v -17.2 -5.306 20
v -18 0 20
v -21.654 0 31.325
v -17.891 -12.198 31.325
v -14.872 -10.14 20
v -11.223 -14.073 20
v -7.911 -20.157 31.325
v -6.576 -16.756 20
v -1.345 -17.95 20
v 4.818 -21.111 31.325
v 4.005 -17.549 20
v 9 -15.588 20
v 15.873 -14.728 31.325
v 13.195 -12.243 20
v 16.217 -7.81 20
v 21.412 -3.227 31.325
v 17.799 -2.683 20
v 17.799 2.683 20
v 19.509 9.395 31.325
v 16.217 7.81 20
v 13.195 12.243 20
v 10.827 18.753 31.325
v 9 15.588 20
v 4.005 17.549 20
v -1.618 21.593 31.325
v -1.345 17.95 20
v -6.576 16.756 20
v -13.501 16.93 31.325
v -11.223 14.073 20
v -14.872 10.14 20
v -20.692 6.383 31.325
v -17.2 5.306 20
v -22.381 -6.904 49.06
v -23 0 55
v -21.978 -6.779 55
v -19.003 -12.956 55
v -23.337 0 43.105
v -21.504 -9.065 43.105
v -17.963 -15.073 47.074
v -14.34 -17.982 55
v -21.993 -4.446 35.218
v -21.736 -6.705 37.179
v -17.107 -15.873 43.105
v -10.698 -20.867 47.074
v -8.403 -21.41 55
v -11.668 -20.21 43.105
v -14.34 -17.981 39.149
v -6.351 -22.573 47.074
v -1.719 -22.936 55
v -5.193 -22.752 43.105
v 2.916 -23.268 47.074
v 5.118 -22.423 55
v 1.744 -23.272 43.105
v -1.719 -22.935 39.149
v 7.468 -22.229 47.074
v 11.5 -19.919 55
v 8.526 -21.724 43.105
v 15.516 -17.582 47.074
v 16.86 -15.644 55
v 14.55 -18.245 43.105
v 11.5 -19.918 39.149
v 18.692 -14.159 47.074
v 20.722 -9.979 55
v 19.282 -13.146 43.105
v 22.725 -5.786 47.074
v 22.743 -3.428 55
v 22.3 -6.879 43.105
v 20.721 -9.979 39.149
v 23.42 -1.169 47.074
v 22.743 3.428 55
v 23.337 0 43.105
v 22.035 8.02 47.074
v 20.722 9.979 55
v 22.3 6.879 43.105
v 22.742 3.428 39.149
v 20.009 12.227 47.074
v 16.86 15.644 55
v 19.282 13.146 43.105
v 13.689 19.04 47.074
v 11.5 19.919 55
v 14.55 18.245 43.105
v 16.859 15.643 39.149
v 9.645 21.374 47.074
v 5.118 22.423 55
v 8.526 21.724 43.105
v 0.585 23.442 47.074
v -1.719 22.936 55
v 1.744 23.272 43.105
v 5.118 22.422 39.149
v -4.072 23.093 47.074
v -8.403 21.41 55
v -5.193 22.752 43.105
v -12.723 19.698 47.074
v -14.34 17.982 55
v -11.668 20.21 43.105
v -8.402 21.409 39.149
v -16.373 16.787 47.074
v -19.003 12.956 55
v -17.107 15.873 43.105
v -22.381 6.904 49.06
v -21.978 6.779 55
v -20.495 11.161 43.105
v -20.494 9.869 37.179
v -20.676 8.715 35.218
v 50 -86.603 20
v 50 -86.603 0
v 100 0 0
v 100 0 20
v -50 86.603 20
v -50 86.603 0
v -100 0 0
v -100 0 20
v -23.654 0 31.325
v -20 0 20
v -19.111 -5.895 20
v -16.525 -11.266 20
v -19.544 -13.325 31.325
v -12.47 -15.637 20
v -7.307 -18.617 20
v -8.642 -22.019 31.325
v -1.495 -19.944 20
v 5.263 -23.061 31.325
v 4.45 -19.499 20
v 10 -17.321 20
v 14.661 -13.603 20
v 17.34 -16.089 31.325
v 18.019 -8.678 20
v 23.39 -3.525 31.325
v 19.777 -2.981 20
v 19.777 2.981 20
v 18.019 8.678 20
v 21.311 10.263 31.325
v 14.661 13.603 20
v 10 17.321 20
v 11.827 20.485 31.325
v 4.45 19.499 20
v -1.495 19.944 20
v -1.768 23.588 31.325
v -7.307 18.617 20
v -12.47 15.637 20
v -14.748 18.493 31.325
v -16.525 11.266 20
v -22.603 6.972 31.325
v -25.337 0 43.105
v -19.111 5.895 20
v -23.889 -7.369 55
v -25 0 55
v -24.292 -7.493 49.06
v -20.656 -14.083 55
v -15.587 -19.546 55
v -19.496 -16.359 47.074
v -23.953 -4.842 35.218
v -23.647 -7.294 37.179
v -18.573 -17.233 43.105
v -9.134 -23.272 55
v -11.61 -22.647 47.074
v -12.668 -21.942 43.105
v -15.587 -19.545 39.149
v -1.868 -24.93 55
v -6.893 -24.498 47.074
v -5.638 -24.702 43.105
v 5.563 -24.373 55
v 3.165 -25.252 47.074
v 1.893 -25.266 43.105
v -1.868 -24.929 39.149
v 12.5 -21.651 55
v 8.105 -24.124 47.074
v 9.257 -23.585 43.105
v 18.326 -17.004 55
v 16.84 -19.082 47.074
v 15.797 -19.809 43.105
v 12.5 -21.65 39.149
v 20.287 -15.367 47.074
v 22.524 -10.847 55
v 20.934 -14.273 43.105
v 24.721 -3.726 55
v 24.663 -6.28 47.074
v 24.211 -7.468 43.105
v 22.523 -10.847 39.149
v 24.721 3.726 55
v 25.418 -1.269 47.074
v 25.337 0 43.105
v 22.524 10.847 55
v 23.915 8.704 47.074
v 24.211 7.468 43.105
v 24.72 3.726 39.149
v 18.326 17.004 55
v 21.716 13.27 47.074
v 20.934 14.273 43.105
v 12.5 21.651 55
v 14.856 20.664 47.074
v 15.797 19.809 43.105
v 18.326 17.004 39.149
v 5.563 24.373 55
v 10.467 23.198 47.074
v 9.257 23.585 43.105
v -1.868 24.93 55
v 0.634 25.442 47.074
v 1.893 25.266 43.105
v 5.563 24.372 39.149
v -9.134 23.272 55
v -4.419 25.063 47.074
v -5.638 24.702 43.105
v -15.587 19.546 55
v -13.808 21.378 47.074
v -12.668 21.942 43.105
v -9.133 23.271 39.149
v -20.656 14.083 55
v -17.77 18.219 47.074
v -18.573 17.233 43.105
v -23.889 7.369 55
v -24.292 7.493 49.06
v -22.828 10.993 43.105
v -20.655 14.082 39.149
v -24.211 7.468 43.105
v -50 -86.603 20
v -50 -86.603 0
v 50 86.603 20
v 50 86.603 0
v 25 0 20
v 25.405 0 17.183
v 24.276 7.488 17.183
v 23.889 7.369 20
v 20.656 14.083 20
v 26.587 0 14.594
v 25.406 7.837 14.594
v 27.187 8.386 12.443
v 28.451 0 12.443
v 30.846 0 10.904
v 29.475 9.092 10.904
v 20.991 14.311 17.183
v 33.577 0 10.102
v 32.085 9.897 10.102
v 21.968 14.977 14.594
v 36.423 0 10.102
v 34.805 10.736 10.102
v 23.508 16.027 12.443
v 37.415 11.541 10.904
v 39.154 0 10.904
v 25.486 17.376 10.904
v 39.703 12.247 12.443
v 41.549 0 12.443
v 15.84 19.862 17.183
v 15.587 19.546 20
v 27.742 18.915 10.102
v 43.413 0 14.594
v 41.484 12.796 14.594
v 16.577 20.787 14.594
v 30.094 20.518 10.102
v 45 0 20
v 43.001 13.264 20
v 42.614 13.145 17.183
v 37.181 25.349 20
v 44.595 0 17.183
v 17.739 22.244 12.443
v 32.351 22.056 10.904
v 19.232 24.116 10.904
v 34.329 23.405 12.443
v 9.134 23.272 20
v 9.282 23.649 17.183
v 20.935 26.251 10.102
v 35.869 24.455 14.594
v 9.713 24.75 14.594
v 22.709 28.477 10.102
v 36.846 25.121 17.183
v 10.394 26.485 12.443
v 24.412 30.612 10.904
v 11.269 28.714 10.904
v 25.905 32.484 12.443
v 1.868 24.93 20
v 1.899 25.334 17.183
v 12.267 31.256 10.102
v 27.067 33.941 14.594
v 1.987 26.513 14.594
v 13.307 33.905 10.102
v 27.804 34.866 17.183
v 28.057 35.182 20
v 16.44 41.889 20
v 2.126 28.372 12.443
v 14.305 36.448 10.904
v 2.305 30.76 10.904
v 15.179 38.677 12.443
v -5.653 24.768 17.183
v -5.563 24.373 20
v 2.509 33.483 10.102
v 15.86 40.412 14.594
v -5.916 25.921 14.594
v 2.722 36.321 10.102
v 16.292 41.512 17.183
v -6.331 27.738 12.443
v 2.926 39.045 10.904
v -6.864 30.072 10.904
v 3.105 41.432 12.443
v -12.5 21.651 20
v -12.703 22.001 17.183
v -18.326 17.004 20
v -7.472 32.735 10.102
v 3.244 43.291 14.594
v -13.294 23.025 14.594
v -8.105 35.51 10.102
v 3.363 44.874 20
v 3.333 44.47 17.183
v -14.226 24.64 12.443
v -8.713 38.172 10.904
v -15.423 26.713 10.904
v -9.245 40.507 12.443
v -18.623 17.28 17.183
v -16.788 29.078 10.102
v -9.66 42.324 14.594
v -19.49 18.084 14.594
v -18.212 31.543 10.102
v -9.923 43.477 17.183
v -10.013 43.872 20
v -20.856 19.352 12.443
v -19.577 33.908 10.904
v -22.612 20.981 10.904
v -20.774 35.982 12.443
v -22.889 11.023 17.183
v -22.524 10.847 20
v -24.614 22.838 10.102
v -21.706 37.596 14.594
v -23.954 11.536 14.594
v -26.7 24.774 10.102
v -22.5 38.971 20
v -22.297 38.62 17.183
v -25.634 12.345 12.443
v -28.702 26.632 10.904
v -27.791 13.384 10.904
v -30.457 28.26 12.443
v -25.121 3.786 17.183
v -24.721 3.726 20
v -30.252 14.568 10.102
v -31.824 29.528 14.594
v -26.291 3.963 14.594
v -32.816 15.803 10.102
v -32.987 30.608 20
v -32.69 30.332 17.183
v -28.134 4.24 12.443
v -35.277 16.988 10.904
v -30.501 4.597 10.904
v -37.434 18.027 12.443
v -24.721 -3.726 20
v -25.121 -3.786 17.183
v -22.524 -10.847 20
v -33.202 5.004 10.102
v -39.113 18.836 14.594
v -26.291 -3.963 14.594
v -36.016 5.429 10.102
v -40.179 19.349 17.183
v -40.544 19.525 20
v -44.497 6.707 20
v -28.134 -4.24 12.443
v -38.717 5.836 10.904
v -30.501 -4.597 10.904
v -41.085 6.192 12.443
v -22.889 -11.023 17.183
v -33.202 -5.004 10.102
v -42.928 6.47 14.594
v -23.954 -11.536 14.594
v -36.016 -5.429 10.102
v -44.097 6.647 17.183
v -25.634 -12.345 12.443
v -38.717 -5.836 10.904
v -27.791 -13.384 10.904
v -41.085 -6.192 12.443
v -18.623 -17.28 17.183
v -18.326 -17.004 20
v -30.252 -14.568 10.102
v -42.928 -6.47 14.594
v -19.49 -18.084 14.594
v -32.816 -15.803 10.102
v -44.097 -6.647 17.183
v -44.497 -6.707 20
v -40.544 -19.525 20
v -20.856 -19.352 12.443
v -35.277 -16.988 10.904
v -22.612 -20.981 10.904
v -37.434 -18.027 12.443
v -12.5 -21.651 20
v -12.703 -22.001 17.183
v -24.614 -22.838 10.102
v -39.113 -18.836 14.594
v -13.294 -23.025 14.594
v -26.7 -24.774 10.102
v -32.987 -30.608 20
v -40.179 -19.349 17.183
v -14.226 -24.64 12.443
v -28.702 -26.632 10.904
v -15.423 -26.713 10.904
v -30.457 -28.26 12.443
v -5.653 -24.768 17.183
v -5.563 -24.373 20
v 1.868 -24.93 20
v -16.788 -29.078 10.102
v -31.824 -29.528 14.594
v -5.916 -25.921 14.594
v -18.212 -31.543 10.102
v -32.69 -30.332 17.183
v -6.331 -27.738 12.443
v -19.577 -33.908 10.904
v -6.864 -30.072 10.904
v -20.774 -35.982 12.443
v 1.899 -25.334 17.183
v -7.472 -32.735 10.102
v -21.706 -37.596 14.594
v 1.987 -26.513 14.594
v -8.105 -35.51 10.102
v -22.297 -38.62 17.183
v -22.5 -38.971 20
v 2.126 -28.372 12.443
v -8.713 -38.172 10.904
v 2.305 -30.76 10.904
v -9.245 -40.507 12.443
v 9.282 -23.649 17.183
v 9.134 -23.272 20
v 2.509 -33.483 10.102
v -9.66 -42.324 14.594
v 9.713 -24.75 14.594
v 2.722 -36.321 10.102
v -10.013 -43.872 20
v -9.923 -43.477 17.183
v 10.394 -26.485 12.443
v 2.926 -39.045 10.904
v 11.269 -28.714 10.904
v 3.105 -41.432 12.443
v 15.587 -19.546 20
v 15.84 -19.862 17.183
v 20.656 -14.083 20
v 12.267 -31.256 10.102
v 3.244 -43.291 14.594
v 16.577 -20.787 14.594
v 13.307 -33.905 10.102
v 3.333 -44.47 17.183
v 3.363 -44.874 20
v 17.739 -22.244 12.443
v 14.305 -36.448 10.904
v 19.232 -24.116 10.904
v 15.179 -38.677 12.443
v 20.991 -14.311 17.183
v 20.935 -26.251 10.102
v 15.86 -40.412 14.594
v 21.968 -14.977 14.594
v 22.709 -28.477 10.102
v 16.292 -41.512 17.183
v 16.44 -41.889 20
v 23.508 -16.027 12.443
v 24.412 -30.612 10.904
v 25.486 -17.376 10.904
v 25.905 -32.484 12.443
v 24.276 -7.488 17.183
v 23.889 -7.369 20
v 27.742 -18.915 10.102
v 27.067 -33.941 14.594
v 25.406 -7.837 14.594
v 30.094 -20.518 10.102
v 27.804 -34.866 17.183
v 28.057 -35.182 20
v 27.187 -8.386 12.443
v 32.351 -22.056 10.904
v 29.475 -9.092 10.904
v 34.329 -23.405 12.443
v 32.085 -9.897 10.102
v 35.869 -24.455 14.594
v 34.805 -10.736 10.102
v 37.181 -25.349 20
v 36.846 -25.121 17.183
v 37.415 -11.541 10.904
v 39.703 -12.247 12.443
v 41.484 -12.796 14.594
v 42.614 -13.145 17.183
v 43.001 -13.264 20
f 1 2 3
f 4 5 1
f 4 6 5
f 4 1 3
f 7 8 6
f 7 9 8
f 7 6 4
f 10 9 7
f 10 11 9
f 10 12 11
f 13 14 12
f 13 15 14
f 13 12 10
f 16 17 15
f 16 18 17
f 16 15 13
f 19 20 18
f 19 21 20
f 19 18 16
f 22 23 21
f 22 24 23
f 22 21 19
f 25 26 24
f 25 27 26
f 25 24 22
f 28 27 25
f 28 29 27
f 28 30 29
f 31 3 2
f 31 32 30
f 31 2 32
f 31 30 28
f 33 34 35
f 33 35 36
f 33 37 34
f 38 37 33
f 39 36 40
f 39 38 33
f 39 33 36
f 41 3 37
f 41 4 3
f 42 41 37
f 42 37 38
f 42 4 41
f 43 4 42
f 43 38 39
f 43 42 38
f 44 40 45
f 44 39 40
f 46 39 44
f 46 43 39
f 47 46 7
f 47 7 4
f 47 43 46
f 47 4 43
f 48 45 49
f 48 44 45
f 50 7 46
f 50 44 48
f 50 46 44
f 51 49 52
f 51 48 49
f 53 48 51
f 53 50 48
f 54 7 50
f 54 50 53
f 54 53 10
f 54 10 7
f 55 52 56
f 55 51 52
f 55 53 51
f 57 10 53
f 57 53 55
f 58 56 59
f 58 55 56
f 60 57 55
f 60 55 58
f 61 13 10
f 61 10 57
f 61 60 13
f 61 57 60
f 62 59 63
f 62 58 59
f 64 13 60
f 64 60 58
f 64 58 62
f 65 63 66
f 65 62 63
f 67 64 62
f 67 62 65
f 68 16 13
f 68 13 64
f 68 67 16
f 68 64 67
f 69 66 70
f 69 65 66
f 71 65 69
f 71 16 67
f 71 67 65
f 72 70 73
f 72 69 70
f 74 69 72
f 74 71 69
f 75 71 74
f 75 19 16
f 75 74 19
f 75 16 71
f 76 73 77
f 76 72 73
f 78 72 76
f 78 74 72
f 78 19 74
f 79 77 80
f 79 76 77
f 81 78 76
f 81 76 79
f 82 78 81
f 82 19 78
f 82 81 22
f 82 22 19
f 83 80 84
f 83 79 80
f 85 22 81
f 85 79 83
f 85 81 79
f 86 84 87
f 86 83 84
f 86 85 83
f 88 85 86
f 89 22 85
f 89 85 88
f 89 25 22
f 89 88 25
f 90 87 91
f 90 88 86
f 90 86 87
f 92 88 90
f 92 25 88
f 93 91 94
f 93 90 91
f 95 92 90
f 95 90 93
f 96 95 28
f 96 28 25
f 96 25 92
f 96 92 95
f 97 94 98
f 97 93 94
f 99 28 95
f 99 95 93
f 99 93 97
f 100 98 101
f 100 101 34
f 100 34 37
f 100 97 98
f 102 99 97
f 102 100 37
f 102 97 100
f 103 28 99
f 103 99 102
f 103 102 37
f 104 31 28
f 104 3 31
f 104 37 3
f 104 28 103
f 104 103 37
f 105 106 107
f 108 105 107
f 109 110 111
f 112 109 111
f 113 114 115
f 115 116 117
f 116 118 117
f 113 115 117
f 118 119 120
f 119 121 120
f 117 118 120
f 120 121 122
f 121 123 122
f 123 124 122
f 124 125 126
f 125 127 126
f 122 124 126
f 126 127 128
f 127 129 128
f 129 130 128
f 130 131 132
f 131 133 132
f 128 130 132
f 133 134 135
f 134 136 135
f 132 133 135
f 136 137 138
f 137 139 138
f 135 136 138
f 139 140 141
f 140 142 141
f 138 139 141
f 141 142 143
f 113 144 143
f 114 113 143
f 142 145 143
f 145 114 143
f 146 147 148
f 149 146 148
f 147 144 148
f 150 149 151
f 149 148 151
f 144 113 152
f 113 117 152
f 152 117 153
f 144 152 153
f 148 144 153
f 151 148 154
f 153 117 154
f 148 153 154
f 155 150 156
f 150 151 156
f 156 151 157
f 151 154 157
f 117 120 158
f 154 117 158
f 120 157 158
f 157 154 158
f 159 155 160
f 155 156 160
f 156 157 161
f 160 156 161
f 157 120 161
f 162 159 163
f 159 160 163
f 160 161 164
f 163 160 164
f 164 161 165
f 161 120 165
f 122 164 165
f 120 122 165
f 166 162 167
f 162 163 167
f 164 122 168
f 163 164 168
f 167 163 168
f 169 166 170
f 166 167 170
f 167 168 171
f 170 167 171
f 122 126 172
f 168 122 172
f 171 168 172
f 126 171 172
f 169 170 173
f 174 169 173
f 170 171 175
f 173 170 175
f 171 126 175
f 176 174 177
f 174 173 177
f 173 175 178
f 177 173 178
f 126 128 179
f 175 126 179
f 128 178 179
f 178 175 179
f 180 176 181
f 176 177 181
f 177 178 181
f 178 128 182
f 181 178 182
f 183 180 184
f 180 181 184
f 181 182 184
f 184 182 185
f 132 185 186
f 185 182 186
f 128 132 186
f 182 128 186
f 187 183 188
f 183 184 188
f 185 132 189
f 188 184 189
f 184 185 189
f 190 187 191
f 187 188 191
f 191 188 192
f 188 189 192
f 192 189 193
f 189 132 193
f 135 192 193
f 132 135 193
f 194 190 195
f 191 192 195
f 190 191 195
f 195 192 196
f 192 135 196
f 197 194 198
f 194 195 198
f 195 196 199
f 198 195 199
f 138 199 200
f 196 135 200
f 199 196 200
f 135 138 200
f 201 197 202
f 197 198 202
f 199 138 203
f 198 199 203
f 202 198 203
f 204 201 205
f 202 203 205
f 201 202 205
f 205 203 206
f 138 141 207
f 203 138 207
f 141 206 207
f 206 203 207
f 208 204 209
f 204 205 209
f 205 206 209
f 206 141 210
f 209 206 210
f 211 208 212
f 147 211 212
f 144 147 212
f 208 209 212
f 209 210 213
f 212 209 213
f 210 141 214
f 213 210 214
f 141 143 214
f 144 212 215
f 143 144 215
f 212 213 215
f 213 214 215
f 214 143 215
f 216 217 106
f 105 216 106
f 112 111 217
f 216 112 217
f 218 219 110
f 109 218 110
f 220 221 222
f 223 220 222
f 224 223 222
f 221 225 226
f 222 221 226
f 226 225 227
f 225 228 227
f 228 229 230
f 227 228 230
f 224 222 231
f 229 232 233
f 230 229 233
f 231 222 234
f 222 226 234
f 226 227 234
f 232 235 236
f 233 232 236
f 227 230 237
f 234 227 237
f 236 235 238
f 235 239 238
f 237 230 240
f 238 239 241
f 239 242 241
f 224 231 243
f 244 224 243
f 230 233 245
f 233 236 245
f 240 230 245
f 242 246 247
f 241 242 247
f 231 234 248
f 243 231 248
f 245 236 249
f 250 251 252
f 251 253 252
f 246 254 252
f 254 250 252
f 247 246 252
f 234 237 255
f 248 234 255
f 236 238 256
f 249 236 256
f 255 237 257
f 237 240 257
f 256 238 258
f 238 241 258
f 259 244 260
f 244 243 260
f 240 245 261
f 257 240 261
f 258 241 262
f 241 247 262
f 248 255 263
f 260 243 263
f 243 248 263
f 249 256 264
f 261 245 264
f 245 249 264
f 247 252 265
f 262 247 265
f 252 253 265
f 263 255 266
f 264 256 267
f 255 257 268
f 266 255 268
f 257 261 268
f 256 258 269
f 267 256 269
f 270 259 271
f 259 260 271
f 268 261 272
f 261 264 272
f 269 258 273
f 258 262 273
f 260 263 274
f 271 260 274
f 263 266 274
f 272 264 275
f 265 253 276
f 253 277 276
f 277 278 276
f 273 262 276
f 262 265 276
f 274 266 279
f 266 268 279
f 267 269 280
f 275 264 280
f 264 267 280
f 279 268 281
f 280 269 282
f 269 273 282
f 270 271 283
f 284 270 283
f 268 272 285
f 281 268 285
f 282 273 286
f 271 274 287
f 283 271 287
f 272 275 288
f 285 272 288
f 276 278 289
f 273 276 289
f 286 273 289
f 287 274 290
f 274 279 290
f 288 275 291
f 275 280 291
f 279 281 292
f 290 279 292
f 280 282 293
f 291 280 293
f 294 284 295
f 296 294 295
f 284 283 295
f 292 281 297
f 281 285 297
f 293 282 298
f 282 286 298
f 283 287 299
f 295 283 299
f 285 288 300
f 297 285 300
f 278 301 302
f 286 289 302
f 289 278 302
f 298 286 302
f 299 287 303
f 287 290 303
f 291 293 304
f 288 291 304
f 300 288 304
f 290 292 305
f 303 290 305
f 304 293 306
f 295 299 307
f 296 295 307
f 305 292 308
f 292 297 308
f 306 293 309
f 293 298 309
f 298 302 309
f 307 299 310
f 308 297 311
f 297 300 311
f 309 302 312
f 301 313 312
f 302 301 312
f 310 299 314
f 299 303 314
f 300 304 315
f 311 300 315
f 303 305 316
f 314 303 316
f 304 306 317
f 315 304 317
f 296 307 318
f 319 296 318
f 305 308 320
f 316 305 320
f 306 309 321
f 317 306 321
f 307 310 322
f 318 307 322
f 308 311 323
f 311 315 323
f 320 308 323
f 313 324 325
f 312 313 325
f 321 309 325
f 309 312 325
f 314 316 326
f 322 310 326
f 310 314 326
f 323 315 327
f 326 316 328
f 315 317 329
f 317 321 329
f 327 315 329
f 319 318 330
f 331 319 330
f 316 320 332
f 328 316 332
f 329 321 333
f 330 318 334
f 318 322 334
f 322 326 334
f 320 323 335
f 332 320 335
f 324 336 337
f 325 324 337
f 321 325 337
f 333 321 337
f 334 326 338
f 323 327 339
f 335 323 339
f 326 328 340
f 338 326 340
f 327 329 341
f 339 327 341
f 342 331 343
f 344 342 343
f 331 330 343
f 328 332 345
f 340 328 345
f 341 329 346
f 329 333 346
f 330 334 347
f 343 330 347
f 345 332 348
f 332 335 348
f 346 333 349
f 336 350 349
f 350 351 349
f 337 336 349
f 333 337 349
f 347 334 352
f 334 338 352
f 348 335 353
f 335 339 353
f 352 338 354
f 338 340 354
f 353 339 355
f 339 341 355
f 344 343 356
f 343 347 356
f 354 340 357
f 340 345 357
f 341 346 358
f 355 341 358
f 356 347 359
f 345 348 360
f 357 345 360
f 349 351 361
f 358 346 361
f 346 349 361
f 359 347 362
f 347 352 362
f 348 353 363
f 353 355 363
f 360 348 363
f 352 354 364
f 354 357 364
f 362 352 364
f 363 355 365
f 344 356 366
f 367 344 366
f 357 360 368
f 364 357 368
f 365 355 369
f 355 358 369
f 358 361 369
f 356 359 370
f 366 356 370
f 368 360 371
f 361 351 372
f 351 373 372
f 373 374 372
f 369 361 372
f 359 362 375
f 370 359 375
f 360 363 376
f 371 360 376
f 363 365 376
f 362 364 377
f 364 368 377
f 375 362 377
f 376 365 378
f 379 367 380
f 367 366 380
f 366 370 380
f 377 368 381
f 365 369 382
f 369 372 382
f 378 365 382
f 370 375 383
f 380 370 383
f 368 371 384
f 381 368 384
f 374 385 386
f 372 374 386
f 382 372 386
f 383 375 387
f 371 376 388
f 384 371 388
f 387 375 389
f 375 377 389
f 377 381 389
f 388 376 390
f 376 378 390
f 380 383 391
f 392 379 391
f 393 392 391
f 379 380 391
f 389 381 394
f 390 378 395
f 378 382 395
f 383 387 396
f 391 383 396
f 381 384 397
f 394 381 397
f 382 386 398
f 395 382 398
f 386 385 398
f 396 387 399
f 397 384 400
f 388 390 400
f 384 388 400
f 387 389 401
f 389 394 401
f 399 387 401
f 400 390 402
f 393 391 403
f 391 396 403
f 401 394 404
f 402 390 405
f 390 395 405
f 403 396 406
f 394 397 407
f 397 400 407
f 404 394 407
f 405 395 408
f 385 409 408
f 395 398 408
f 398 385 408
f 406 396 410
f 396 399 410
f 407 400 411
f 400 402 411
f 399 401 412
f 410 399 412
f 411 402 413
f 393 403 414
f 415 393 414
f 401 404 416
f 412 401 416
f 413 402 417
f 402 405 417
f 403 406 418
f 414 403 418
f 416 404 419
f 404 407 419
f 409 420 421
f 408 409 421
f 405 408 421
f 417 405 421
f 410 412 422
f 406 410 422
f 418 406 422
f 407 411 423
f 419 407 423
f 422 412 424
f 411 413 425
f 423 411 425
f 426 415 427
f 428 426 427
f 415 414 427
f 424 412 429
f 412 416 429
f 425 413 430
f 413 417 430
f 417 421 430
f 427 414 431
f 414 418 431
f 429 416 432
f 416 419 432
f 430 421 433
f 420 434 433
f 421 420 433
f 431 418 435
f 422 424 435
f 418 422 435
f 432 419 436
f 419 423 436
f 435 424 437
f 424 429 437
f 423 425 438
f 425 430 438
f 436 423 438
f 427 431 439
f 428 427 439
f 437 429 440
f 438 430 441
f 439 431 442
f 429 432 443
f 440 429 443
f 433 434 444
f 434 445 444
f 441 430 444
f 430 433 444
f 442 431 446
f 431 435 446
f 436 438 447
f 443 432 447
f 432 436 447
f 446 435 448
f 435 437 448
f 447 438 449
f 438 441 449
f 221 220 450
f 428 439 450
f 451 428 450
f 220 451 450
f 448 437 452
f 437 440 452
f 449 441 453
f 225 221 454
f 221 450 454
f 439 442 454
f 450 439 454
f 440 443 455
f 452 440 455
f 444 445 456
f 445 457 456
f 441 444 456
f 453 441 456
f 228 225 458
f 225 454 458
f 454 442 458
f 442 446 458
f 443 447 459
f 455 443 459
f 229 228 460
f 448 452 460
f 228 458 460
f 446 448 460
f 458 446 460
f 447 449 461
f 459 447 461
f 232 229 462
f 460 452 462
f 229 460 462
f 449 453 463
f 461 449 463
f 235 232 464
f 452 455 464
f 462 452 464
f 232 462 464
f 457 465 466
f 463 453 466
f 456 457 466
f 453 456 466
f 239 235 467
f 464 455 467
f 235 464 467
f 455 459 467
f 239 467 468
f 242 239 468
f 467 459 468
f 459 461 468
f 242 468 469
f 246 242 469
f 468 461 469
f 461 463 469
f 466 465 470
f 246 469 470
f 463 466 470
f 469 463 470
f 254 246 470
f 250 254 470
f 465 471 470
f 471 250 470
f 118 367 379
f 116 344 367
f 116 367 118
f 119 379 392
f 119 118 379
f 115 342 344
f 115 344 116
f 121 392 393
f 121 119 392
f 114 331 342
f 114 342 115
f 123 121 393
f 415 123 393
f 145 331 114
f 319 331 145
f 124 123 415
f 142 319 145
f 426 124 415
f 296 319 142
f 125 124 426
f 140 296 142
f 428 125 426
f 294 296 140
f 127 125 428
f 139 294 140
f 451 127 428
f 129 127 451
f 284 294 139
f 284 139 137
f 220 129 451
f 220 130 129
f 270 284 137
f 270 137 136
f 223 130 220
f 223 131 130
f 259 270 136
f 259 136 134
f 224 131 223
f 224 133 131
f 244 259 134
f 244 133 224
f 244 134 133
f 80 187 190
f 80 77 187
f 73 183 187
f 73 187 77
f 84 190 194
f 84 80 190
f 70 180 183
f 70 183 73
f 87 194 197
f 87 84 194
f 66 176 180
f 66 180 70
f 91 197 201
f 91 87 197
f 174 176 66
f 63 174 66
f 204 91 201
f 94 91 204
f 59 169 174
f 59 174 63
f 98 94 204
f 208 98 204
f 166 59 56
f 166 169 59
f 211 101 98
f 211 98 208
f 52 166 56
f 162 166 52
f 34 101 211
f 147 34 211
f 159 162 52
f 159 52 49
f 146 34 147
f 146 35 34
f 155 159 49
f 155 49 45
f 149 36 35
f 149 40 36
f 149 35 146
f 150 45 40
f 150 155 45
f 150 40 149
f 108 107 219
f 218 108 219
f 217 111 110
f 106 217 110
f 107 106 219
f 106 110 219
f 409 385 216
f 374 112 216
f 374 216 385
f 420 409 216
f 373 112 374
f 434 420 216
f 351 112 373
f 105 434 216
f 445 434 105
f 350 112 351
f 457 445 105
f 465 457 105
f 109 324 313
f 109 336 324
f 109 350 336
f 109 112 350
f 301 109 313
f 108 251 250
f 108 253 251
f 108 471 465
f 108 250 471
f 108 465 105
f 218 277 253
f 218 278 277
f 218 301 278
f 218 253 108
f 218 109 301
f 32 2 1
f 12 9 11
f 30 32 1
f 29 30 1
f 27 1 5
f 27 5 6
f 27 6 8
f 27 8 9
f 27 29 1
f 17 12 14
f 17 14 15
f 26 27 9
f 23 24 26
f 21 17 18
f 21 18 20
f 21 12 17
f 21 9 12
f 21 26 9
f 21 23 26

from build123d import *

# Parameters (mm, degrees)
PAD_DEPTH   = 20
SKETCH002_R = 10


with BuildPart() as part:
    # Sketch → Pad (new body)
    with BuildSketch(Plane.XY):
        Polygon((100, 0), (50, 86.60254), (-50, 86.60254), (-100, 0), (-50, -86.60254), (50, -86.60254), align=None)
    extrude(amount=PAD_DEPTH)

    # Sketch001 → Revolution (revolve)
    with BuildSketch(Plane.XZ):
        with BuildLine():
            ThreePointArc((-25, 55), (-24.74611, 37.179127), (-20, 20))
            Line((-20, 20), (-18, 20))
            ThreePointArc((-23, 55), (-22.74611, 37.179127), (-18, 20))
            Line((-25, 55), (-23, 55))
        make_face()
    revolve(axis=Axis((0, 0, 0), (0, 0, 1)))

    # Sketch002 → Groove (revolve, cut)
    with BuildSketch(Plane.XZ):
        with Locations((35, 20)):
            Circle(SKETCH002_R)
    revolve(axis=Axis((0, 0, 0), (0, 0, 1)), mode=Mode.SUBTRACT)


solid = part.part
